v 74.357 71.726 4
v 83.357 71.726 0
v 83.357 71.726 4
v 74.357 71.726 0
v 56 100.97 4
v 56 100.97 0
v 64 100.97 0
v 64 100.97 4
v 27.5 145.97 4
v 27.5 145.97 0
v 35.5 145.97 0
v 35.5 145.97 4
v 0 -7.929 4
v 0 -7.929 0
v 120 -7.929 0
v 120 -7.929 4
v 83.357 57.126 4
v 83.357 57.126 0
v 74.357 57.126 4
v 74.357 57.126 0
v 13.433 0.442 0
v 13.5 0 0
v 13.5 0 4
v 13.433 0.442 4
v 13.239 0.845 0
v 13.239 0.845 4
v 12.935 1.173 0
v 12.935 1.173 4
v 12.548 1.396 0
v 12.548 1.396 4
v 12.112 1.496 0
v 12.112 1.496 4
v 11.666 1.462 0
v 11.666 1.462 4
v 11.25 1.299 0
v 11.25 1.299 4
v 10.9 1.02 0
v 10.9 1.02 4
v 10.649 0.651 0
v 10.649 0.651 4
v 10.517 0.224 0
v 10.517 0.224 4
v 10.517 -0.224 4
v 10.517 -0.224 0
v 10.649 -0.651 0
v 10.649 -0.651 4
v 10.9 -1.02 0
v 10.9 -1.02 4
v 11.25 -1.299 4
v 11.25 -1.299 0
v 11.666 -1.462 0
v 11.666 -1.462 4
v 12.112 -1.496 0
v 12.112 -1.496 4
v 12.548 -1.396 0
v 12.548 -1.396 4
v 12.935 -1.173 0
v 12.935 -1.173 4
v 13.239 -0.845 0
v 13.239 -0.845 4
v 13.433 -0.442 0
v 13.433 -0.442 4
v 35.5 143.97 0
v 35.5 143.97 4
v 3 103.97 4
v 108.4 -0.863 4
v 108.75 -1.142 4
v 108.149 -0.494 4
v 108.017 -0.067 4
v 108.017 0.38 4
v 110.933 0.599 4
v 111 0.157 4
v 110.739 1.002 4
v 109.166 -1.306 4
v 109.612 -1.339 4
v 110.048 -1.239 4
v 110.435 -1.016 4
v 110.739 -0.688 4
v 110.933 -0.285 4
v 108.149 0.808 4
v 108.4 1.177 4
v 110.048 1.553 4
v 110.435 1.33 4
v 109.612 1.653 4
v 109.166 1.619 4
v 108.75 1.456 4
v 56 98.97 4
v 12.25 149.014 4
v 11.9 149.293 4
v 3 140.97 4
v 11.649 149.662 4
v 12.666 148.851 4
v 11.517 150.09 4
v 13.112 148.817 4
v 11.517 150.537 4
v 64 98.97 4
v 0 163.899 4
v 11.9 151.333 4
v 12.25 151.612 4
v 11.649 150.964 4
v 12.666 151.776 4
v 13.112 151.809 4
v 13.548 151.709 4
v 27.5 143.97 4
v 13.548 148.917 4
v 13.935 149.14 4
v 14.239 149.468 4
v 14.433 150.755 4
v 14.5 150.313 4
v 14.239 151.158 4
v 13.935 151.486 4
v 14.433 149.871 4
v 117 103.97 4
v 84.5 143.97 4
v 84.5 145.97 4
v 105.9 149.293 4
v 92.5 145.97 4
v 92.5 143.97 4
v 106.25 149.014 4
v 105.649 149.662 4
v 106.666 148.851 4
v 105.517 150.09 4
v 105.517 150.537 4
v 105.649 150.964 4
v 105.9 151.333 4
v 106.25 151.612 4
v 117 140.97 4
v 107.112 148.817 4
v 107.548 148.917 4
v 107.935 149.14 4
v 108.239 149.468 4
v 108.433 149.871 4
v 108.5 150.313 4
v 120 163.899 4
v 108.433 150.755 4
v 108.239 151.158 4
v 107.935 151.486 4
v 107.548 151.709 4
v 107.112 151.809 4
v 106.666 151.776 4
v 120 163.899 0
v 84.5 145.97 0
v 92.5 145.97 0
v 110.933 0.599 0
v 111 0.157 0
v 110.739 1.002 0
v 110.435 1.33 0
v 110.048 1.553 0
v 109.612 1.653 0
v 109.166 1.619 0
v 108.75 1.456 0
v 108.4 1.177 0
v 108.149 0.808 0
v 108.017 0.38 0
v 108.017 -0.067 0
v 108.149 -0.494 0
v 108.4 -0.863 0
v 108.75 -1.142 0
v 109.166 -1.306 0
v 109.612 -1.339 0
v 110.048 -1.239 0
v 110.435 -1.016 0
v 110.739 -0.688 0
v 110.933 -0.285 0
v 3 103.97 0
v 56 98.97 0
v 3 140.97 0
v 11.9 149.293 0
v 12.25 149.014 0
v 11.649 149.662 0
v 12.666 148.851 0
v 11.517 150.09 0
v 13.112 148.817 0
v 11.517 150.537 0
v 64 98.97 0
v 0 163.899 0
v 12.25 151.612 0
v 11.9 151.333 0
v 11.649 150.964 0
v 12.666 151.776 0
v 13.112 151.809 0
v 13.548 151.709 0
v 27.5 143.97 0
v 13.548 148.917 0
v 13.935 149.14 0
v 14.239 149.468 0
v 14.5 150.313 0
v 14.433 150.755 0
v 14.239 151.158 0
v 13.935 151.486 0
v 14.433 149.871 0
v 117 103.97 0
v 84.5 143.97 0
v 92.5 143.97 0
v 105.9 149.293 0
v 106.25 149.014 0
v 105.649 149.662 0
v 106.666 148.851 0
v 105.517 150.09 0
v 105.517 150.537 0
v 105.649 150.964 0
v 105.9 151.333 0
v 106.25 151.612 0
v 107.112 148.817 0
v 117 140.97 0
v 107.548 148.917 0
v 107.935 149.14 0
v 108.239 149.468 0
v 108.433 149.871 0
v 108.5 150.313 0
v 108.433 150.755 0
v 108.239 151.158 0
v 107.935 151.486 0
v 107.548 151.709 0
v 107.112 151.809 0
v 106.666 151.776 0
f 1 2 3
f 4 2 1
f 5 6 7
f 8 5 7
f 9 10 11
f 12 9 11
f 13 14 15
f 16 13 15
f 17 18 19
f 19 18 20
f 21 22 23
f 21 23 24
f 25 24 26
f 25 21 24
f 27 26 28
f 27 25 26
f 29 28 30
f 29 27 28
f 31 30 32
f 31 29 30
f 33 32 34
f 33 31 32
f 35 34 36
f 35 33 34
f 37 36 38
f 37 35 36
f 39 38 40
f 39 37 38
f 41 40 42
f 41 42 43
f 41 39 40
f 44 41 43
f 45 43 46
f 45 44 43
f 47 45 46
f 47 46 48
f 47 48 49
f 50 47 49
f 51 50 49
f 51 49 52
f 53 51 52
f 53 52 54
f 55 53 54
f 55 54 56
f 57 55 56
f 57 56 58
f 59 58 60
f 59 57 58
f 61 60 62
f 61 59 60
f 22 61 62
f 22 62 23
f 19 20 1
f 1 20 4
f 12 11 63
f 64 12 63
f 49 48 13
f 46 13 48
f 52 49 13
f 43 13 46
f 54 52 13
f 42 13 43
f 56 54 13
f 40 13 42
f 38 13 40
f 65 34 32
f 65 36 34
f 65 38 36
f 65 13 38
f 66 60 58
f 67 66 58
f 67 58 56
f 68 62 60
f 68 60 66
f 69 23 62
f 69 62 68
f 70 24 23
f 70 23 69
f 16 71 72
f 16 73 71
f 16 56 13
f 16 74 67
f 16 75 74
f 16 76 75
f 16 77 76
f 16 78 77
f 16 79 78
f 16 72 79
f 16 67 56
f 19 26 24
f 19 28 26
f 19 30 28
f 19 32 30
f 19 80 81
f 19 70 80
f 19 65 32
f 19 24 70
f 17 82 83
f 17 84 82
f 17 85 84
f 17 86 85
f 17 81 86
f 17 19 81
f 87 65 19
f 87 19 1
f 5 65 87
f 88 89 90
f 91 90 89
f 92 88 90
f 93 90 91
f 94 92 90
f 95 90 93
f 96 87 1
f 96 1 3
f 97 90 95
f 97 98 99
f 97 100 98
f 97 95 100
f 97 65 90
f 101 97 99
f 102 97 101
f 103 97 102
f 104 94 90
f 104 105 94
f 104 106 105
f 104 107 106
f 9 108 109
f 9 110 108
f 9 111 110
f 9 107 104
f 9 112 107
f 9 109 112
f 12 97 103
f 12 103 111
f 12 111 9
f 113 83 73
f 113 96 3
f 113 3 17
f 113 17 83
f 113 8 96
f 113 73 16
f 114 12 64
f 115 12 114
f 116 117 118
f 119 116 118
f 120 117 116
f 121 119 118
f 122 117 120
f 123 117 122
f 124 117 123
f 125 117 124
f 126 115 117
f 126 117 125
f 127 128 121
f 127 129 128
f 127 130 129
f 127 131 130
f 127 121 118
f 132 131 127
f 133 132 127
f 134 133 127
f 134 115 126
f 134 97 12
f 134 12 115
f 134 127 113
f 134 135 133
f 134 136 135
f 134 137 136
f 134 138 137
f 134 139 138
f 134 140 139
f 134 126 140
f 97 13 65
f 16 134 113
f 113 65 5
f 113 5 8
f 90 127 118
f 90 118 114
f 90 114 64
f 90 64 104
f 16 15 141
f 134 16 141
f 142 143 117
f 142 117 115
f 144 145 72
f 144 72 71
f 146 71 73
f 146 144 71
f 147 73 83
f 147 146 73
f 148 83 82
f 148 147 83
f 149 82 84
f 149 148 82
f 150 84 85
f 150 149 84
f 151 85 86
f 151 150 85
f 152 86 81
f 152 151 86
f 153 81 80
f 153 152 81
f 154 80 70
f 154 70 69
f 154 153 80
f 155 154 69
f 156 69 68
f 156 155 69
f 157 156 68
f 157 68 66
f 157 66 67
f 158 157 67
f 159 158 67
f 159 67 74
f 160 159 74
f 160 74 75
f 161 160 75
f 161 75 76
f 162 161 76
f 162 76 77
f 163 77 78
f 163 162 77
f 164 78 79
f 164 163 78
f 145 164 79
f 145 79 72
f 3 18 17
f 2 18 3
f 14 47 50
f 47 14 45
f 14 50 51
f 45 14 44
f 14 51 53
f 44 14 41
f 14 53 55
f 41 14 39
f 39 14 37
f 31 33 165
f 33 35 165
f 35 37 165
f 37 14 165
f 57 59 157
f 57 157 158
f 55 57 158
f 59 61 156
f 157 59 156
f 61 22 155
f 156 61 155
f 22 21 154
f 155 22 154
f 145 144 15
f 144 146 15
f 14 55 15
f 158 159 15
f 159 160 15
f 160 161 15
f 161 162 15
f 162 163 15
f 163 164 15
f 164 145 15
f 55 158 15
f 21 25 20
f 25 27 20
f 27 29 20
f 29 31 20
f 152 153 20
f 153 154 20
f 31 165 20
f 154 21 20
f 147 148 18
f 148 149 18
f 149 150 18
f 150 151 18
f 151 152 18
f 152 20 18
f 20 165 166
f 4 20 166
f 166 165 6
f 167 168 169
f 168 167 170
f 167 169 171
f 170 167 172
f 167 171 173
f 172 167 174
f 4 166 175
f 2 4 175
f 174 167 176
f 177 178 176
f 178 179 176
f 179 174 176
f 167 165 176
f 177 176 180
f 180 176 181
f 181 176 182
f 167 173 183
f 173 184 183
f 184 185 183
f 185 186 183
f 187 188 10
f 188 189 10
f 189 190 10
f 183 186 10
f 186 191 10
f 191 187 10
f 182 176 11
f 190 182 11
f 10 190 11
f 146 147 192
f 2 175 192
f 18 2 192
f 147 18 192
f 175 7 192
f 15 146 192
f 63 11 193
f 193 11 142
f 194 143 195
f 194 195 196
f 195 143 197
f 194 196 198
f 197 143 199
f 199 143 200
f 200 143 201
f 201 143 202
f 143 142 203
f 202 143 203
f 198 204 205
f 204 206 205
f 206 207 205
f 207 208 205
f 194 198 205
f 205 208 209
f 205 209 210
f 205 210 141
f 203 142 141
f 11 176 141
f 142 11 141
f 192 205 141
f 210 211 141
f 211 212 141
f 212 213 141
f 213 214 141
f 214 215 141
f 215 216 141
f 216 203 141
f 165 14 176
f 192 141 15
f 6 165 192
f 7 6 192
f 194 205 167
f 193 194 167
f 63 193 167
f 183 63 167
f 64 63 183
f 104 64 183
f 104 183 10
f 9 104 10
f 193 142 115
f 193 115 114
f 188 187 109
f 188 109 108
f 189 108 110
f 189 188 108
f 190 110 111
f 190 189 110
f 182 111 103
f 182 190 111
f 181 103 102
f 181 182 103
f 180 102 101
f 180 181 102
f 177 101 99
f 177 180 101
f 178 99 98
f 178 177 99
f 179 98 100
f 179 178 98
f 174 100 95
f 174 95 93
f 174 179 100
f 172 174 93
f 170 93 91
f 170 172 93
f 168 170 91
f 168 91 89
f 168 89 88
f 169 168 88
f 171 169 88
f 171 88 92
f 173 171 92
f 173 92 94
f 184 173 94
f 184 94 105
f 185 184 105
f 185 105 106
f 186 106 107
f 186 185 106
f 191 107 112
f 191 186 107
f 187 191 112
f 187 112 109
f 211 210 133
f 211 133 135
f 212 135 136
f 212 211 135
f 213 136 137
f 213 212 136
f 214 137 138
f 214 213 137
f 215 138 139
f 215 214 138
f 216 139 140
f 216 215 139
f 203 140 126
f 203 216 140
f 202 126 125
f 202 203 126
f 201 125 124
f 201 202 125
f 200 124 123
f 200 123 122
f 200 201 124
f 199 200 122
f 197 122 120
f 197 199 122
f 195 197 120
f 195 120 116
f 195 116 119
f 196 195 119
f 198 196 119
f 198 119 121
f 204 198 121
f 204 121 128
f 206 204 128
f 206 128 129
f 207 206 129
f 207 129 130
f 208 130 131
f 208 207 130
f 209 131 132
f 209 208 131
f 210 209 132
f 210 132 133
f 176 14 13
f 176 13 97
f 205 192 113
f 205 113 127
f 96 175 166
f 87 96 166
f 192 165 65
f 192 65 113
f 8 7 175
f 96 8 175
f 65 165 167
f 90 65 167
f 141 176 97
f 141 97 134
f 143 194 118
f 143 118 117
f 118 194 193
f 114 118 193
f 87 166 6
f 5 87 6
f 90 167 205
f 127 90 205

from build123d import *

# Parameters (mm, degrees)
SKETCH1_W           = 120
SKETCH1_H           = 171.827864376
SKETCH1_R           = 1.5
SKETCH1_W_2         = 114
SKETCH1_H_2         = 37
BOSS_EXTRUDE1_DEPTH = 4
SKETCH2_W           = 9
SKETCH2_H           = 14.6
CUT_EXTRUDE1_DEPTH  = 5


with BuildPart() as part:
    # Sketch1 → Boss-Extrude1 (new body)
    with BuildSketch(Plane.XY):
        with Locations((60, 77.985)):
            Rectangle(SKETCH1_W, SKETCH1_H)
        with Locations((13, 150.313145751)):
            Circle(SKETCH1_R, mode=Mode.SUBTRACT)
        with Locations((107, 150.313145751)):
            Circle(SKETCH1_R, mode=Mode.SUBTRACT)
        with Locations((109.5, 0.156854249)):
            Circle(SKETCH1_R, mode=Mode.SUBTRACT)
        with Locations((12, 0)):
            Circle(SKETCH1_R, mode=Mode.SUBTRACT)
        with Locations((60, 122.47)):
            Rectangle(SKETCH1_W_2, SKETCH1_H_2, mode=Mode.SUBTRACT)
        Polygon((31.5, 143.97), (27.5, 143.97), (27.5, 145.97), (35.5, 145.97), (35.5, 143.97), align=None, mode=Mode.SUBTRACT)
        Polygon((92.5, 145.97), (84.5, 145.97), (84.5, 143.97), (88.5, 143.97), (92.5, 143.97), align=None, mode=Mode.SUBTRACT)
        Polygon((60, 98.97), (56, 98.97), (56, 100.97), (64, 100.97), (64, 98.97), align=None, mode=Mode.SUBTRACT)
    extrude(amount=BOSS_EXTRUDE1_DEPTH)

    # Sketch2 → Cut-Extrude1 (cut, through all)
    with BuildSketch(Plane(origin=(0, 0, 0), x_dir=(-1, 0, 0), z_dir=(0, 0, -1))):
        with Locations((-78.856585714, 64.426127197)):
            Rectangle(SKETCH2_W, SKETCH2_H)
    extrude(amount=-CUT_EXTRUDE1_DEPTH, mode=Mode.SUBTRACT)


solid = part.part
